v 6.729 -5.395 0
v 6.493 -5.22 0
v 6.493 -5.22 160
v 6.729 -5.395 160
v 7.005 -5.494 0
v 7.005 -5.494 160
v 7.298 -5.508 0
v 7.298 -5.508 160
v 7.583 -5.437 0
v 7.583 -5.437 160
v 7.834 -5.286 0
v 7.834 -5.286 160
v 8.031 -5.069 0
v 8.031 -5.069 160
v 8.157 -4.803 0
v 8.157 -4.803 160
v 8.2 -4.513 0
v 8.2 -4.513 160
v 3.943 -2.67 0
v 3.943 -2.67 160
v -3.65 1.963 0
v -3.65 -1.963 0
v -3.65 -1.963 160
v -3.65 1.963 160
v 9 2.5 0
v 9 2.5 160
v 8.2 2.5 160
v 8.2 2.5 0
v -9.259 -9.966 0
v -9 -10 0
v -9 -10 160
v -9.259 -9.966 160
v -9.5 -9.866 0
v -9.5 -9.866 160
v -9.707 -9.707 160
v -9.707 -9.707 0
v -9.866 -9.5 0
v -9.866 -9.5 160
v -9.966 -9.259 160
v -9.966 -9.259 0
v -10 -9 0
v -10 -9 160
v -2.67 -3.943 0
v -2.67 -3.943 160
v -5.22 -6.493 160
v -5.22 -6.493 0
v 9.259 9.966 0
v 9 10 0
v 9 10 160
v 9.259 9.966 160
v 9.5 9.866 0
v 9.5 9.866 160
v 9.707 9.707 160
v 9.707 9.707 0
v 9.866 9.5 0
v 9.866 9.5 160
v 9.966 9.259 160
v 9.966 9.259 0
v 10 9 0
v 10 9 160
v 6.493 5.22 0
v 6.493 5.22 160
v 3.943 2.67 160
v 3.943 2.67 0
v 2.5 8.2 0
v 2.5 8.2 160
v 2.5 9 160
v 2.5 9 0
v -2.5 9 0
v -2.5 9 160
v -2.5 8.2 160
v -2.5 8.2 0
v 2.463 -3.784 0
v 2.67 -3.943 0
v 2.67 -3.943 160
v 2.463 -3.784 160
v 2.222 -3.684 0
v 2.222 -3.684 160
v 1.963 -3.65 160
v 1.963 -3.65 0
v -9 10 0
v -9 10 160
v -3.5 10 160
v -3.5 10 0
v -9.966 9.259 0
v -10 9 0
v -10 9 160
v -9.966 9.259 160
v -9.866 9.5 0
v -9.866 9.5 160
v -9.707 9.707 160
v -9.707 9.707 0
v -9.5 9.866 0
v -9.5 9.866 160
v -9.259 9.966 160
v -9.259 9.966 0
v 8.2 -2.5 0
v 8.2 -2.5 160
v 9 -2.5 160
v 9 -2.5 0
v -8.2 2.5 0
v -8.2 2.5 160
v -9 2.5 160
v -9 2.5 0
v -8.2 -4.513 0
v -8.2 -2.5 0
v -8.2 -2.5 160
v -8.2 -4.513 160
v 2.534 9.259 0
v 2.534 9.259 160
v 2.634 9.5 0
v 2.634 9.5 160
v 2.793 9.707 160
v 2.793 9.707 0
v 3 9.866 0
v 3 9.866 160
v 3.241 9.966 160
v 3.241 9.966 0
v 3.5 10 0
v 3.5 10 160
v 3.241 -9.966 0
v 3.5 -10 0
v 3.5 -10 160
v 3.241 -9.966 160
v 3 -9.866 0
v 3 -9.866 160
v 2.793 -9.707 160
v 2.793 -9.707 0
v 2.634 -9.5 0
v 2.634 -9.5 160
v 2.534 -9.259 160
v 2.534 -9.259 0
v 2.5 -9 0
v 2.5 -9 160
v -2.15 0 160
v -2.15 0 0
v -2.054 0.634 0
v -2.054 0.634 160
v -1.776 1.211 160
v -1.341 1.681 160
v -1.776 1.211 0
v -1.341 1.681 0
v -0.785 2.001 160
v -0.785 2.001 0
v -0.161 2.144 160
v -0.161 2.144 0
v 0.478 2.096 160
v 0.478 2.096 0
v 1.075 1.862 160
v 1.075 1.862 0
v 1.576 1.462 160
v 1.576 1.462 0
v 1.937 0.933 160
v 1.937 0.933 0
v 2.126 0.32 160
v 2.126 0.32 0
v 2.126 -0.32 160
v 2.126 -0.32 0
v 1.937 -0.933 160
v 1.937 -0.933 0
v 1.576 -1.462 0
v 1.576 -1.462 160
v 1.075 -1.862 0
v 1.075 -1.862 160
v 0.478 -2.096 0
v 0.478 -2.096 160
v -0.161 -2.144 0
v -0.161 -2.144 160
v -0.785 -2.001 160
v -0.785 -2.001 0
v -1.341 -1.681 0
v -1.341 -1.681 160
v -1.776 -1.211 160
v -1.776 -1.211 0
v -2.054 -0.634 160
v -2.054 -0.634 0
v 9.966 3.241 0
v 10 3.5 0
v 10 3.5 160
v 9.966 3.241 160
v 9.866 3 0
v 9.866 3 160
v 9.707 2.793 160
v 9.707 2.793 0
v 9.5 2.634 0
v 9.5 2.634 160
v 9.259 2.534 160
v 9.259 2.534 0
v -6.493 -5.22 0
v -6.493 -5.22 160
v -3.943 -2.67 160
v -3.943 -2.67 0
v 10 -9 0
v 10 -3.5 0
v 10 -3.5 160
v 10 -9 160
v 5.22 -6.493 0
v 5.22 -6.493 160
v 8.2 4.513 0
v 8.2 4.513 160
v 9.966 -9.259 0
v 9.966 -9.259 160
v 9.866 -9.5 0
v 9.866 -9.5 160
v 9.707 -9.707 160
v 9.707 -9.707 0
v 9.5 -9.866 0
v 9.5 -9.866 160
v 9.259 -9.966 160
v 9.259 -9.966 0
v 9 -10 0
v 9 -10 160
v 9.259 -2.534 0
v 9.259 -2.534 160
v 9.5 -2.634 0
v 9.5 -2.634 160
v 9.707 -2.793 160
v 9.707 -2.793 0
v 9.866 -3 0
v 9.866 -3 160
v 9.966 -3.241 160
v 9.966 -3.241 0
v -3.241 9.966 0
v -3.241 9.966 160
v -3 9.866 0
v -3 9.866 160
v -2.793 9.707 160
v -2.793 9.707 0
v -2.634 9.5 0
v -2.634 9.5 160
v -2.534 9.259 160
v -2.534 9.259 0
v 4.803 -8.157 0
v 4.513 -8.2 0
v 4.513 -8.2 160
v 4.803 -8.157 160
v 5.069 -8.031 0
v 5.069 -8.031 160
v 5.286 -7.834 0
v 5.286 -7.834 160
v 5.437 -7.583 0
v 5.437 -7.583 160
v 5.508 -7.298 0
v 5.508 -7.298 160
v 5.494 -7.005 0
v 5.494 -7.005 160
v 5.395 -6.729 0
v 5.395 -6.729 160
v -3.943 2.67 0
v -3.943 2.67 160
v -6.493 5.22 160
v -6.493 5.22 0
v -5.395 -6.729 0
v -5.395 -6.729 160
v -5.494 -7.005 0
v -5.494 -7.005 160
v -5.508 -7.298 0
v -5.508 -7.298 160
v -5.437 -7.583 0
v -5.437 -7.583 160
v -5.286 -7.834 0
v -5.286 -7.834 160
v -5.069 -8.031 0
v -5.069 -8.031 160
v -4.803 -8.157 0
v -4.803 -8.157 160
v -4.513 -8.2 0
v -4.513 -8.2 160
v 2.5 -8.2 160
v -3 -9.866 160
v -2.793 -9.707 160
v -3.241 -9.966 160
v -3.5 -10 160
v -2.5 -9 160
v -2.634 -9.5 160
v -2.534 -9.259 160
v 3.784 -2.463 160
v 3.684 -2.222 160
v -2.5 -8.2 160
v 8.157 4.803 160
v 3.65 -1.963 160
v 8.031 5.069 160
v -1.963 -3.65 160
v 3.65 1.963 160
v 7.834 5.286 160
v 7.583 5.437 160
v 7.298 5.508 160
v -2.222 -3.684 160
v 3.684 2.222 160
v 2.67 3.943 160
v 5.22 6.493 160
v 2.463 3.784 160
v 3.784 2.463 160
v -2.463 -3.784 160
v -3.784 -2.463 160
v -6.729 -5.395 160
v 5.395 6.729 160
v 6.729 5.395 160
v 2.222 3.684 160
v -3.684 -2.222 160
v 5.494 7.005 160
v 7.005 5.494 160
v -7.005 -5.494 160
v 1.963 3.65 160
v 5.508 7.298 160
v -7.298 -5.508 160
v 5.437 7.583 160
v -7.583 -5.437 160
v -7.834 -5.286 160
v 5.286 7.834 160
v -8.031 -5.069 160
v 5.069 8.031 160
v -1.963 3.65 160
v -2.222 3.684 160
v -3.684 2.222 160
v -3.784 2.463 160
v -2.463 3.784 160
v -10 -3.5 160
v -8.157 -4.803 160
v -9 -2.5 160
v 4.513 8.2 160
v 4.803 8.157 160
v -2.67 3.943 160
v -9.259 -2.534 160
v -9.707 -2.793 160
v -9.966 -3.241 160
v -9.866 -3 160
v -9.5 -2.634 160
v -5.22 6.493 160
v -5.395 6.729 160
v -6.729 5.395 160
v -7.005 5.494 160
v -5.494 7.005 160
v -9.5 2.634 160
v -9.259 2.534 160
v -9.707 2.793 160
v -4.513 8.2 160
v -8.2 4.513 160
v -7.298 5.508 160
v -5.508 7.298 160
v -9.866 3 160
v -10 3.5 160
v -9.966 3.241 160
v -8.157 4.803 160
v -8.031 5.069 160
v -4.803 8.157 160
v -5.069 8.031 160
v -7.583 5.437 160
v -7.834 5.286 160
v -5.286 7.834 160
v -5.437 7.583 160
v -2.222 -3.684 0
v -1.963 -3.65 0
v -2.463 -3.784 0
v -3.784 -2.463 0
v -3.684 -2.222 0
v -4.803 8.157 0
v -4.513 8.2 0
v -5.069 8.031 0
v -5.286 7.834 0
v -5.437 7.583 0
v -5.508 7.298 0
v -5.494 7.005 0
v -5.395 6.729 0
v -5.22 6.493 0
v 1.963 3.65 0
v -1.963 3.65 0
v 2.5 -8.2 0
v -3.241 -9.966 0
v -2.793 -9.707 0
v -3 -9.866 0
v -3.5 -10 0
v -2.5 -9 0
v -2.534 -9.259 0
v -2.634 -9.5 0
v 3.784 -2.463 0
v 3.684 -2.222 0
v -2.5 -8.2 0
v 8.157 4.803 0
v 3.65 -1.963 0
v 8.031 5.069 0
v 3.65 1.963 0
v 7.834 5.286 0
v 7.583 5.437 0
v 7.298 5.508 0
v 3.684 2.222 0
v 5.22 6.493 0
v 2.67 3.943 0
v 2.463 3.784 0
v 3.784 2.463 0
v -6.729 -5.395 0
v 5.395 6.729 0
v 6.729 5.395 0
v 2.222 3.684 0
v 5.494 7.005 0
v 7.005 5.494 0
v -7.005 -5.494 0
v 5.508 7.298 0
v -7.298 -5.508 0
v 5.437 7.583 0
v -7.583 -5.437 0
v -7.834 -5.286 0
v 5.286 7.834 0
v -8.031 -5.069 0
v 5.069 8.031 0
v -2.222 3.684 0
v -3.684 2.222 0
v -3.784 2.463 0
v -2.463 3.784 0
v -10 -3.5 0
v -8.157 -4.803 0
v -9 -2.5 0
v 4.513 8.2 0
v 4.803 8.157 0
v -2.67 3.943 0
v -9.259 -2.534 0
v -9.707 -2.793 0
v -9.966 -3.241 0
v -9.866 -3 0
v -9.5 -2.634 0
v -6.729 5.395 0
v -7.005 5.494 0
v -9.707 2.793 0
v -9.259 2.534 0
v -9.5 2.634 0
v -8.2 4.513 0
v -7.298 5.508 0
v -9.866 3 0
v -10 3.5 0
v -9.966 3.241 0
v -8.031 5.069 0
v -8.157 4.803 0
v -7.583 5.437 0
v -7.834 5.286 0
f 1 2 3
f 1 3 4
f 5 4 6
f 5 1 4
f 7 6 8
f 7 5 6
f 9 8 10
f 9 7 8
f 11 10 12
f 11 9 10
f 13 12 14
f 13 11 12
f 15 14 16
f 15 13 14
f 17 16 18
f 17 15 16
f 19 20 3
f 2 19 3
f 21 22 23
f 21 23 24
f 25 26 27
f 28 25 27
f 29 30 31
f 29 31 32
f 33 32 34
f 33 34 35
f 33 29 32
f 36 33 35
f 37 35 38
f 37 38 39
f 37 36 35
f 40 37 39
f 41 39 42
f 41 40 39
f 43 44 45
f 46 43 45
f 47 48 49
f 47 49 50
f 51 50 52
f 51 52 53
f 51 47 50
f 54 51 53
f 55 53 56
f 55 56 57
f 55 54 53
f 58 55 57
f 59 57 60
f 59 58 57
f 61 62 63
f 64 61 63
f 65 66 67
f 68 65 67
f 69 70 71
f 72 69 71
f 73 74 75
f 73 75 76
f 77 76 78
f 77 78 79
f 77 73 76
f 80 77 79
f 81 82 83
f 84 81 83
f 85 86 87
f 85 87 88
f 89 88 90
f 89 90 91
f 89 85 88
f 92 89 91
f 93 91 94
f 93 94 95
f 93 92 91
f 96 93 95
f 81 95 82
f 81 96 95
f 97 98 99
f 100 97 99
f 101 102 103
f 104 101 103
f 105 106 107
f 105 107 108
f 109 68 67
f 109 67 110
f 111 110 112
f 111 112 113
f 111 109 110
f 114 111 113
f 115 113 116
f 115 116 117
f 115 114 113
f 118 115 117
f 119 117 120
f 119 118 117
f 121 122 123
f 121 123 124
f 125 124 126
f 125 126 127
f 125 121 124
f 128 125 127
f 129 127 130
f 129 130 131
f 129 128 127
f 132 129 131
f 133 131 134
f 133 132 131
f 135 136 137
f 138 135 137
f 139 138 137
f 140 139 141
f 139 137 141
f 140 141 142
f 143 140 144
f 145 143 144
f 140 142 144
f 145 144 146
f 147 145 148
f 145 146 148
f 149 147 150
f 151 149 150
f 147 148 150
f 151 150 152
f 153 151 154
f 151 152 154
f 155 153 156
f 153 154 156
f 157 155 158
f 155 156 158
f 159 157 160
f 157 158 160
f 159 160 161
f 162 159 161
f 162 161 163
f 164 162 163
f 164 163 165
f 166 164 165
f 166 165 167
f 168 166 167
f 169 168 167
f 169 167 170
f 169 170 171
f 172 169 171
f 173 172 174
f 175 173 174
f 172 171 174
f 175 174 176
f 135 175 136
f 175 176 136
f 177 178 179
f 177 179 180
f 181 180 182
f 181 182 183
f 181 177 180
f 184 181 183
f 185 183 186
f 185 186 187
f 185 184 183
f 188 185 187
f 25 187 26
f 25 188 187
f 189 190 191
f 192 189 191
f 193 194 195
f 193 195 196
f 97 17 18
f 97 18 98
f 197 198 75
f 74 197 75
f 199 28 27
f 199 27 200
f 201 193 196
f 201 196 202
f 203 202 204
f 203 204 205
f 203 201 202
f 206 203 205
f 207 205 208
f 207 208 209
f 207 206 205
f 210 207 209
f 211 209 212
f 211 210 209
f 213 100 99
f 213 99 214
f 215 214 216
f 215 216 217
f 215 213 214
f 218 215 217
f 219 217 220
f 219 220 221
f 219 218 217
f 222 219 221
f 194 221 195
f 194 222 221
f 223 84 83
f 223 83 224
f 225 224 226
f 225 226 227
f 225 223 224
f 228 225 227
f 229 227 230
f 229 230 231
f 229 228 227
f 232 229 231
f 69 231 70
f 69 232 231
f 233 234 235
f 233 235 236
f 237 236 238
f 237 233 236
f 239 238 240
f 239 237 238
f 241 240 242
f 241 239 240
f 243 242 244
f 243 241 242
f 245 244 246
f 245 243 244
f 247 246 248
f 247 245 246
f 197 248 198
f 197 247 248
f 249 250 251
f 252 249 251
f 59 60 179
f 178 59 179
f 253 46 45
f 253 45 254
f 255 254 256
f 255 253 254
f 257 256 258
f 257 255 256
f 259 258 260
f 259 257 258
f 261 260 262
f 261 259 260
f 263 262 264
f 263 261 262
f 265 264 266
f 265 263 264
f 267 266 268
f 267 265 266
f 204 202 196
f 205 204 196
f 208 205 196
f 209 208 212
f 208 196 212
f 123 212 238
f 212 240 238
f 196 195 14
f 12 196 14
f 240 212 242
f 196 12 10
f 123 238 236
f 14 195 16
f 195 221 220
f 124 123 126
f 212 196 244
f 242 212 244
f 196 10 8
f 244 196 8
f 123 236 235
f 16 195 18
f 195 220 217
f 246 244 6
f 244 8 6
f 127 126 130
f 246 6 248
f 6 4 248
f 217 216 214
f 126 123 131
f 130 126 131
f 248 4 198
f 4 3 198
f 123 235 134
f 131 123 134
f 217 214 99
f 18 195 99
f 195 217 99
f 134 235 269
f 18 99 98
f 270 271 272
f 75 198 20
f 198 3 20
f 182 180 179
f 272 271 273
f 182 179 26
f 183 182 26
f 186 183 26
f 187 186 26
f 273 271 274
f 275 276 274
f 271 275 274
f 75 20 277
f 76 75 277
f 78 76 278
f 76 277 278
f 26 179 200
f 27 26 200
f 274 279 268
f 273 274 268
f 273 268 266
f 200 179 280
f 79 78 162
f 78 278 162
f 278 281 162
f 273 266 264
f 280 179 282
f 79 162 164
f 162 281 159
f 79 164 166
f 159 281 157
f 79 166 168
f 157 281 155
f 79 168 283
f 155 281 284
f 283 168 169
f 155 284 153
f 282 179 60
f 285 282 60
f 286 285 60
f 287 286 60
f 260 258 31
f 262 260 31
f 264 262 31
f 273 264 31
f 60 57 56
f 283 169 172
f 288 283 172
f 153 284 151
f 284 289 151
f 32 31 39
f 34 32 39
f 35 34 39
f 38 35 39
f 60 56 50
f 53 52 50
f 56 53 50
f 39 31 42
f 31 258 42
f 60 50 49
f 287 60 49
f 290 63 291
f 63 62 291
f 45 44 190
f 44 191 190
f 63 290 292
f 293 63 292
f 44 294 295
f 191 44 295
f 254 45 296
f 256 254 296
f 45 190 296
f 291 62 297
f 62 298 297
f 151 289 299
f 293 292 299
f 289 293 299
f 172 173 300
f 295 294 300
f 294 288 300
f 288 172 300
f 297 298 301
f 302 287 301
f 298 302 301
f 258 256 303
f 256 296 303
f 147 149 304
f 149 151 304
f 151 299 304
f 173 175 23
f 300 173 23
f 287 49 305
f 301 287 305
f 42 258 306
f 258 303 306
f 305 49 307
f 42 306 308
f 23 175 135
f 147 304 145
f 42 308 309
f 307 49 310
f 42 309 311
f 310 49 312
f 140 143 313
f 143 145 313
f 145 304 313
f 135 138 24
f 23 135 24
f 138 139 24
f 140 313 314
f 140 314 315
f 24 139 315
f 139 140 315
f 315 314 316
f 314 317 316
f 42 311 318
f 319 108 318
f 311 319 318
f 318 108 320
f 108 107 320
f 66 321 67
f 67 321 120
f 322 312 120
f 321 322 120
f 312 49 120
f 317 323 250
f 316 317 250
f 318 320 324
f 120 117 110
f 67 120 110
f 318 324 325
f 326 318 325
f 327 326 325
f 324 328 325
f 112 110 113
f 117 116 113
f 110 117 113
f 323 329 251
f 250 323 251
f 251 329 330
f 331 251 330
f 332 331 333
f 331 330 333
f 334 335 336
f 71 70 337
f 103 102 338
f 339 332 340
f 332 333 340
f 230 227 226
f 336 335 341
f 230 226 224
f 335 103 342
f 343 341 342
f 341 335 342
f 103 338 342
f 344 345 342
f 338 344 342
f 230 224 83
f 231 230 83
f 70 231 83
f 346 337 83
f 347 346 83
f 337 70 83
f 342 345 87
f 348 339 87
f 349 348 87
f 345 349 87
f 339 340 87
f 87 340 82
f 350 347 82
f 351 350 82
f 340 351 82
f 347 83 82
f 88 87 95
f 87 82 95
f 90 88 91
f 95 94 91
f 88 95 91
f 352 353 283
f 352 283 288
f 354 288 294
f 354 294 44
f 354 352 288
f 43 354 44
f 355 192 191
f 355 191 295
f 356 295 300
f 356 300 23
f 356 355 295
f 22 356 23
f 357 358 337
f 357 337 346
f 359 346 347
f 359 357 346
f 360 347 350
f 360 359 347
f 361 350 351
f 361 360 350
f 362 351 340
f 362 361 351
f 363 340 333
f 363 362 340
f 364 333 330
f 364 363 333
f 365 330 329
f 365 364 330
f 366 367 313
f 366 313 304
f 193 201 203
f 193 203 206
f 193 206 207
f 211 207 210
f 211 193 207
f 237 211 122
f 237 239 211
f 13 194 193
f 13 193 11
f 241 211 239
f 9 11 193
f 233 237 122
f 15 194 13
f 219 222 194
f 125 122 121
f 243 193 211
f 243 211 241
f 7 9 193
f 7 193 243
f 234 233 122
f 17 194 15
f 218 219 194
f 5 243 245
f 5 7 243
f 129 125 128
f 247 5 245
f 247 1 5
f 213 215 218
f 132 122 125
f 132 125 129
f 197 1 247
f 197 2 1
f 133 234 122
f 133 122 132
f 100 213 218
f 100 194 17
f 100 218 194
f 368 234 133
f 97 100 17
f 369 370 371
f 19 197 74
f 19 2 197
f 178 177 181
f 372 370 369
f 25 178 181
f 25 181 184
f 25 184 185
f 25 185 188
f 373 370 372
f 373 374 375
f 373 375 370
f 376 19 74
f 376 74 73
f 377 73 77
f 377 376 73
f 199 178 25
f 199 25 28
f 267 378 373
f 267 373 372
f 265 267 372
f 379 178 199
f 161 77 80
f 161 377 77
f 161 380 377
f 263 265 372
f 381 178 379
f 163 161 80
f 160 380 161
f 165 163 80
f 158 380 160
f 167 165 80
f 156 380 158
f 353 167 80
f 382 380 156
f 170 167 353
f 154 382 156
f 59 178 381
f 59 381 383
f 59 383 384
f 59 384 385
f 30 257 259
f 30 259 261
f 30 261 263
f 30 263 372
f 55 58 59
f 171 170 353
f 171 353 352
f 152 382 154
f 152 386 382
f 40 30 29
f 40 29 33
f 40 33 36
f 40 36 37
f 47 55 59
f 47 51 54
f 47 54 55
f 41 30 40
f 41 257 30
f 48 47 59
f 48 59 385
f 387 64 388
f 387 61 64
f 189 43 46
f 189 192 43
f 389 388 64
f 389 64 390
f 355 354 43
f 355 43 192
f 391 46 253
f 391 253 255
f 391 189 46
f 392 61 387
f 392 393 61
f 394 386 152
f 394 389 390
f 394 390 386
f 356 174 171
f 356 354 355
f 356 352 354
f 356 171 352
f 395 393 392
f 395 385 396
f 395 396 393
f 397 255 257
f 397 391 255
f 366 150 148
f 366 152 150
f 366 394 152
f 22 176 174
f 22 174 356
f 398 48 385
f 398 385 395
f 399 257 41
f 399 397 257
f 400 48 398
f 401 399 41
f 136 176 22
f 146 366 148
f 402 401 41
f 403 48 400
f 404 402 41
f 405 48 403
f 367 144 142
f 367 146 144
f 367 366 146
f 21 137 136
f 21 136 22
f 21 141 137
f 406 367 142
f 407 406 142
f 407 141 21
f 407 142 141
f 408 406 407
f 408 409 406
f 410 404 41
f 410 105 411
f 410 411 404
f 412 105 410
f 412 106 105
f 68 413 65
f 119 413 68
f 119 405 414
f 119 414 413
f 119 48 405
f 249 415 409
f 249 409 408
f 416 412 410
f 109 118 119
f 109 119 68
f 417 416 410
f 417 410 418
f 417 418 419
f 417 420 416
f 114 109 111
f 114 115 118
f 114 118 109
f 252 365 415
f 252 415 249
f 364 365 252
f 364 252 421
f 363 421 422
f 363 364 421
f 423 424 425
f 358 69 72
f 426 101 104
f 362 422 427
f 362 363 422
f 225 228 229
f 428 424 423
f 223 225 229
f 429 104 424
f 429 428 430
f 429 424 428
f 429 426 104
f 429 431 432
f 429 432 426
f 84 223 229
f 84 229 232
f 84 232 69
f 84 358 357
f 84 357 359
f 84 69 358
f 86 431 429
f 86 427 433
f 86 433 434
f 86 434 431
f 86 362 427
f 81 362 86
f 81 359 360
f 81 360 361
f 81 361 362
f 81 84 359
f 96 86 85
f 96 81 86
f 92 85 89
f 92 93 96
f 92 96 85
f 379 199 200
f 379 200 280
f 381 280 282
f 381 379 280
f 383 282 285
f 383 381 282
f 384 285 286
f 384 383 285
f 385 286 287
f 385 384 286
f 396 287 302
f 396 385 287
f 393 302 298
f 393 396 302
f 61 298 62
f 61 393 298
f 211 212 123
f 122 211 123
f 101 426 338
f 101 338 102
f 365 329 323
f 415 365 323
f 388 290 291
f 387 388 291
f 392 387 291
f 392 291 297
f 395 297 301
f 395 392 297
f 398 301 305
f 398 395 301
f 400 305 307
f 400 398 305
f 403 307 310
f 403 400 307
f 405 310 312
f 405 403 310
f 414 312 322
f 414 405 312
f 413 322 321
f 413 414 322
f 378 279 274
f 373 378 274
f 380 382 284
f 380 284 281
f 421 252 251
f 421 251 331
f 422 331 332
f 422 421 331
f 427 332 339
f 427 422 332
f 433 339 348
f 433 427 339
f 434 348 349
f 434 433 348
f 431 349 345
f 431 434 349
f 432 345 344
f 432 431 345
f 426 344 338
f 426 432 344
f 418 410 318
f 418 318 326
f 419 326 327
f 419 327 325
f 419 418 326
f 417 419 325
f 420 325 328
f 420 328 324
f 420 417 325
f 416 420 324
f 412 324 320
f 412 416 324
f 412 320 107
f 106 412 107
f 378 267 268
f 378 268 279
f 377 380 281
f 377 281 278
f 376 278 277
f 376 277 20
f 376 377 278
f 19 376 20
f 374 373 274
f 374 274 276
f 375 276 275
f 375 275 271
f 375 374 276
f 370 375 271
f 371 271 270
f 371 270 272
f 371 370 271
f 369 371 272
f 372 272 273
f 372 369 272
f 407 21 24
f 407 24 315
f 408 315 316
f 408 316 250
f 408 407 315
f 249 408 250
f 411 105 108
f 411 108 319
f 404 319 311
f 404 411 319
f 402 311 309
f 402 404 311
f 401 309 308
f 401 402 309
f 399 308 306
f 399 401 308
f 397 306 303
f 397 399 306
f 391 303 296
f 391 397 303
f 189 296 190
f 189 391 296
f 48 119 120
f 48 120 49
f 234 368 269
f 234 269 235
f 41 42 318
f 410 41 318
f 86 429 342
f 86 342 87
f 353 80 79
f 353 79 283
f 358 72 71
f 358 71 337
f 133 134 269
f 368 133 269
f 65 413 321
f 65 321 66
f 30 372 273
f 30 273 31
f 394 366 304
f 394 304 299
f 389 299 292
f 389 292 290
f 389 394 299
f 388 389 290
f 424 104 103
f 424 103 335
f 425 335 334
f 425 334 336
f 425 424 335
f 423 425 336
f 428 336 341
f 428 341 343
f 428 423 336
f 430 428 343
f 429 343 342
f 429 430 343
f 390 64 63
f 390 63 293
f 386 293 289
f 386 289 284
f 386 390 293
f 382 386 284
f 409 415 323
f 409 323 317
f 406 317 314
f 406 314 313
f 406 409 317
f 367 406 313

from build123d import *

# Parameters (mm, degrees)
SCHIZZO1_R                   = 2.15
ESTRUSIONE_ESTRUSIONE1_DEPTH = 160


with BuildPart() as part:
    # Schizzo1 → Estrusione-Estrusione1 (new body)
    with BuildSketch(Plane(origin=(0, 0, 0), x_dir=(-1, 0, 0), z_dir=(0, 0, -1))):
        with BuildLine():
            Line((8.2, 2.5), (9, 2.5))
            ThreePointArc((9, 2.5), (9.707106781, 2.792893219), (10, 3.5))
            Line((10, 3.5), (10, 9))
            ThreePointArc((10, 9), (9.707106781, 9.707106781), (9, 10))
            Line((9, 10), (3.5, 10))
            ThreePointArc((3.5, 10), (2.792893219, 9.707106781), (2.5, 9))
            Line((2.5, 9), (2.5, 8.2))
            Line((2.5, 8.2), (4.512994231, 8.2))
            ThreePointArc((4.512994231, 8.2), (5.436873764, 7.582683432), (5.220101013, 6.492893219))
            Line((5.220101013, 6.492893219), (2.670101013, 3.942893219))
            ThreePointArc((2.670101013, 3.942893219), (2.345677664, 3.726120467), (1.962994231, 3.65))
            Line((1.962994231, 3.65), (-1.962994231, 3.65))
            ThreePointArc((-1.962994231, 3.65), (-2.345677664, 3.726120467), (-2.670101013, 3.942893219))
            Line((-2.670101013, 3.942893219), (-5.220101013, 6.492893219))
            ThreePointArc((-5.220101013, 6.492893219), (-5.436873764, 7.582683432), (-4.512994231, 8.2))
            Line((-4.512994231, 8.2), (-2.5, 8.2))
            Line((-2.5, 8.2), (-2.5, 9))
            ThreePointArc((-2.5, 9), (-2.792893219, 9.707106781), (-3.5, 10))
            Line((-3.5, 10), (-9, 10))
            ThreePointArc((-9, 10), (-9.707106781, 9.707106781), (-10, 9))
            Line((-10, 9), (-10, 3.5))
            ThreePointArc((-10, 3.5), (-9.707106781, 2.792893219), (-9, 2.5))
            Line((-9, 2.5), (-8.2, 2.5))
            Line((-8.2, 2.5), (-8.2, 4.512994231))
            ThreePointArc((-8.2, 4.512994231), (-7.582683432, 5.436873764), (-6.492893219, 5.220101013))
            Line((-6.492893219, 5.220101013), (-3.942893219, 2.670101013))
            ThreePointArc((-3.942893219, 2.670101013), (-3.726120467, 2.345677664), (-3.65, 1.962994231))
            Line((-3.65, 1.962994231), (-3.65, -1.962994231))
            ThreePointArc((-3.65, -1.962994231), (-3.726120467, -2.345677664), (-3.942893219, -2.670101013))
            Line((-3.942893219, -2.670101013), (-6.492893219, -5.220101013))
            ThreePointArc((-6.492893219, -5.220101013), (-7.582683432, -5.436873764), (-8.2, -4.512994231))
            Line((-8.2, -4.512994231), (-8.2, -2.5))
            Line((-8.2, -2.5), (-9, -2.5))
            ThreePointArc((-9, -2.5), (-9.707106781, -2.792893219), (-10, -3.5))
            Line((-10, -3.5), (-10, -9))
            ThreePointArc((-10, -9), (-9.707106781, -9.707106781), (-9, -10))
            Line((-9, -10), (-3.5, -10))
            ThreePointArc((-3.5, -10), (-2.792893219, -9.707106781), (-2.5, -9))
            Line((-2.5, -9), (-2.5, -8.2))
            Line((-2.5, -8.2), (-4.512994231, -8.2))
            ThreePointArc((-4.512994231, -8.2), (-5.436873764, -7.582683432), (-5.220101013, -6.492893219))
            Line((-5.220101013, -6.492893219), (-2.670101013, -3.942893219))
            ThreePointArc((-2.670101013, -3.942893219), (-2.345677664, -3.726120467), (-1.962994231, -3.65))
            Line((-1.962994231, -3.65), (1.962994231, -3.65))
            ThreePointArc((1.962994231, -3.65), (2.345677664, -3.726120467), (2.670101013, -3.942893219))
            Line((2.670101013, -3.942893219), (5.220101013, -6.492893219))
            ThreePointArc((5.220101013, -6.492893219), (5.436873764, -7.582683432), (4.512994231, -8.2))
            Line((4.512994231, -8.2), (2.5, -8.2))
            Line((2.5, -8.2), (2.5, -9))
            ThreePointArc((2.5, -9), (2.792893219, -9.707106781), (3.5, -10))
            Line((3.5, -10), (9, -10))
            ThreePointArc((9, -10), (9.707106781, -9.707106781), (10, -9))
            Line((10, -9), (10, -3.5))
            ThreePointArc((10, -3.5), (9.707106781, -2.792893219), (9, -2.5))
            Line((9, -2.5), (8.2, -2.5))
            Line((8.2, -2.5), (8.2, -4.512994231))
            ThreePointArc((8.2, -4.512994231), (7.582683432, -5.436873764), (6.492893219, -5.220101013))
            Line((6.492893219, -5.220101013), (3.942893219, -2.670101013))
            ThreePointArc((3.942893219, -2.670101013), (3.726120467, -2.345677664), (3.65, -1.962994231))
            Line((3.65, -1.962994231), (3.65, 1.962994231))
            ThreePointArc((3.65, 1.962994231), (3.726120467, 2.345677664), (3.942893219, 2.670101013))
            Line((3.942893219, 2.670101013), (6.492893219, 5.220101013))
            ThreePointArc((6.492893219, 5.220101013), (7.582683432, 5.436873764), (8.2, 4.512994231))
            Line((8.2, 4.512994231), (8.2, 2.5))
        make_face()
        Circle(SCHIZZO1_R, mode=Mode.SUBTRACT)
    extrude(amount=-ESTRUSIONE_ESTRUSIONE1_DEPTH)


solid = part.part
